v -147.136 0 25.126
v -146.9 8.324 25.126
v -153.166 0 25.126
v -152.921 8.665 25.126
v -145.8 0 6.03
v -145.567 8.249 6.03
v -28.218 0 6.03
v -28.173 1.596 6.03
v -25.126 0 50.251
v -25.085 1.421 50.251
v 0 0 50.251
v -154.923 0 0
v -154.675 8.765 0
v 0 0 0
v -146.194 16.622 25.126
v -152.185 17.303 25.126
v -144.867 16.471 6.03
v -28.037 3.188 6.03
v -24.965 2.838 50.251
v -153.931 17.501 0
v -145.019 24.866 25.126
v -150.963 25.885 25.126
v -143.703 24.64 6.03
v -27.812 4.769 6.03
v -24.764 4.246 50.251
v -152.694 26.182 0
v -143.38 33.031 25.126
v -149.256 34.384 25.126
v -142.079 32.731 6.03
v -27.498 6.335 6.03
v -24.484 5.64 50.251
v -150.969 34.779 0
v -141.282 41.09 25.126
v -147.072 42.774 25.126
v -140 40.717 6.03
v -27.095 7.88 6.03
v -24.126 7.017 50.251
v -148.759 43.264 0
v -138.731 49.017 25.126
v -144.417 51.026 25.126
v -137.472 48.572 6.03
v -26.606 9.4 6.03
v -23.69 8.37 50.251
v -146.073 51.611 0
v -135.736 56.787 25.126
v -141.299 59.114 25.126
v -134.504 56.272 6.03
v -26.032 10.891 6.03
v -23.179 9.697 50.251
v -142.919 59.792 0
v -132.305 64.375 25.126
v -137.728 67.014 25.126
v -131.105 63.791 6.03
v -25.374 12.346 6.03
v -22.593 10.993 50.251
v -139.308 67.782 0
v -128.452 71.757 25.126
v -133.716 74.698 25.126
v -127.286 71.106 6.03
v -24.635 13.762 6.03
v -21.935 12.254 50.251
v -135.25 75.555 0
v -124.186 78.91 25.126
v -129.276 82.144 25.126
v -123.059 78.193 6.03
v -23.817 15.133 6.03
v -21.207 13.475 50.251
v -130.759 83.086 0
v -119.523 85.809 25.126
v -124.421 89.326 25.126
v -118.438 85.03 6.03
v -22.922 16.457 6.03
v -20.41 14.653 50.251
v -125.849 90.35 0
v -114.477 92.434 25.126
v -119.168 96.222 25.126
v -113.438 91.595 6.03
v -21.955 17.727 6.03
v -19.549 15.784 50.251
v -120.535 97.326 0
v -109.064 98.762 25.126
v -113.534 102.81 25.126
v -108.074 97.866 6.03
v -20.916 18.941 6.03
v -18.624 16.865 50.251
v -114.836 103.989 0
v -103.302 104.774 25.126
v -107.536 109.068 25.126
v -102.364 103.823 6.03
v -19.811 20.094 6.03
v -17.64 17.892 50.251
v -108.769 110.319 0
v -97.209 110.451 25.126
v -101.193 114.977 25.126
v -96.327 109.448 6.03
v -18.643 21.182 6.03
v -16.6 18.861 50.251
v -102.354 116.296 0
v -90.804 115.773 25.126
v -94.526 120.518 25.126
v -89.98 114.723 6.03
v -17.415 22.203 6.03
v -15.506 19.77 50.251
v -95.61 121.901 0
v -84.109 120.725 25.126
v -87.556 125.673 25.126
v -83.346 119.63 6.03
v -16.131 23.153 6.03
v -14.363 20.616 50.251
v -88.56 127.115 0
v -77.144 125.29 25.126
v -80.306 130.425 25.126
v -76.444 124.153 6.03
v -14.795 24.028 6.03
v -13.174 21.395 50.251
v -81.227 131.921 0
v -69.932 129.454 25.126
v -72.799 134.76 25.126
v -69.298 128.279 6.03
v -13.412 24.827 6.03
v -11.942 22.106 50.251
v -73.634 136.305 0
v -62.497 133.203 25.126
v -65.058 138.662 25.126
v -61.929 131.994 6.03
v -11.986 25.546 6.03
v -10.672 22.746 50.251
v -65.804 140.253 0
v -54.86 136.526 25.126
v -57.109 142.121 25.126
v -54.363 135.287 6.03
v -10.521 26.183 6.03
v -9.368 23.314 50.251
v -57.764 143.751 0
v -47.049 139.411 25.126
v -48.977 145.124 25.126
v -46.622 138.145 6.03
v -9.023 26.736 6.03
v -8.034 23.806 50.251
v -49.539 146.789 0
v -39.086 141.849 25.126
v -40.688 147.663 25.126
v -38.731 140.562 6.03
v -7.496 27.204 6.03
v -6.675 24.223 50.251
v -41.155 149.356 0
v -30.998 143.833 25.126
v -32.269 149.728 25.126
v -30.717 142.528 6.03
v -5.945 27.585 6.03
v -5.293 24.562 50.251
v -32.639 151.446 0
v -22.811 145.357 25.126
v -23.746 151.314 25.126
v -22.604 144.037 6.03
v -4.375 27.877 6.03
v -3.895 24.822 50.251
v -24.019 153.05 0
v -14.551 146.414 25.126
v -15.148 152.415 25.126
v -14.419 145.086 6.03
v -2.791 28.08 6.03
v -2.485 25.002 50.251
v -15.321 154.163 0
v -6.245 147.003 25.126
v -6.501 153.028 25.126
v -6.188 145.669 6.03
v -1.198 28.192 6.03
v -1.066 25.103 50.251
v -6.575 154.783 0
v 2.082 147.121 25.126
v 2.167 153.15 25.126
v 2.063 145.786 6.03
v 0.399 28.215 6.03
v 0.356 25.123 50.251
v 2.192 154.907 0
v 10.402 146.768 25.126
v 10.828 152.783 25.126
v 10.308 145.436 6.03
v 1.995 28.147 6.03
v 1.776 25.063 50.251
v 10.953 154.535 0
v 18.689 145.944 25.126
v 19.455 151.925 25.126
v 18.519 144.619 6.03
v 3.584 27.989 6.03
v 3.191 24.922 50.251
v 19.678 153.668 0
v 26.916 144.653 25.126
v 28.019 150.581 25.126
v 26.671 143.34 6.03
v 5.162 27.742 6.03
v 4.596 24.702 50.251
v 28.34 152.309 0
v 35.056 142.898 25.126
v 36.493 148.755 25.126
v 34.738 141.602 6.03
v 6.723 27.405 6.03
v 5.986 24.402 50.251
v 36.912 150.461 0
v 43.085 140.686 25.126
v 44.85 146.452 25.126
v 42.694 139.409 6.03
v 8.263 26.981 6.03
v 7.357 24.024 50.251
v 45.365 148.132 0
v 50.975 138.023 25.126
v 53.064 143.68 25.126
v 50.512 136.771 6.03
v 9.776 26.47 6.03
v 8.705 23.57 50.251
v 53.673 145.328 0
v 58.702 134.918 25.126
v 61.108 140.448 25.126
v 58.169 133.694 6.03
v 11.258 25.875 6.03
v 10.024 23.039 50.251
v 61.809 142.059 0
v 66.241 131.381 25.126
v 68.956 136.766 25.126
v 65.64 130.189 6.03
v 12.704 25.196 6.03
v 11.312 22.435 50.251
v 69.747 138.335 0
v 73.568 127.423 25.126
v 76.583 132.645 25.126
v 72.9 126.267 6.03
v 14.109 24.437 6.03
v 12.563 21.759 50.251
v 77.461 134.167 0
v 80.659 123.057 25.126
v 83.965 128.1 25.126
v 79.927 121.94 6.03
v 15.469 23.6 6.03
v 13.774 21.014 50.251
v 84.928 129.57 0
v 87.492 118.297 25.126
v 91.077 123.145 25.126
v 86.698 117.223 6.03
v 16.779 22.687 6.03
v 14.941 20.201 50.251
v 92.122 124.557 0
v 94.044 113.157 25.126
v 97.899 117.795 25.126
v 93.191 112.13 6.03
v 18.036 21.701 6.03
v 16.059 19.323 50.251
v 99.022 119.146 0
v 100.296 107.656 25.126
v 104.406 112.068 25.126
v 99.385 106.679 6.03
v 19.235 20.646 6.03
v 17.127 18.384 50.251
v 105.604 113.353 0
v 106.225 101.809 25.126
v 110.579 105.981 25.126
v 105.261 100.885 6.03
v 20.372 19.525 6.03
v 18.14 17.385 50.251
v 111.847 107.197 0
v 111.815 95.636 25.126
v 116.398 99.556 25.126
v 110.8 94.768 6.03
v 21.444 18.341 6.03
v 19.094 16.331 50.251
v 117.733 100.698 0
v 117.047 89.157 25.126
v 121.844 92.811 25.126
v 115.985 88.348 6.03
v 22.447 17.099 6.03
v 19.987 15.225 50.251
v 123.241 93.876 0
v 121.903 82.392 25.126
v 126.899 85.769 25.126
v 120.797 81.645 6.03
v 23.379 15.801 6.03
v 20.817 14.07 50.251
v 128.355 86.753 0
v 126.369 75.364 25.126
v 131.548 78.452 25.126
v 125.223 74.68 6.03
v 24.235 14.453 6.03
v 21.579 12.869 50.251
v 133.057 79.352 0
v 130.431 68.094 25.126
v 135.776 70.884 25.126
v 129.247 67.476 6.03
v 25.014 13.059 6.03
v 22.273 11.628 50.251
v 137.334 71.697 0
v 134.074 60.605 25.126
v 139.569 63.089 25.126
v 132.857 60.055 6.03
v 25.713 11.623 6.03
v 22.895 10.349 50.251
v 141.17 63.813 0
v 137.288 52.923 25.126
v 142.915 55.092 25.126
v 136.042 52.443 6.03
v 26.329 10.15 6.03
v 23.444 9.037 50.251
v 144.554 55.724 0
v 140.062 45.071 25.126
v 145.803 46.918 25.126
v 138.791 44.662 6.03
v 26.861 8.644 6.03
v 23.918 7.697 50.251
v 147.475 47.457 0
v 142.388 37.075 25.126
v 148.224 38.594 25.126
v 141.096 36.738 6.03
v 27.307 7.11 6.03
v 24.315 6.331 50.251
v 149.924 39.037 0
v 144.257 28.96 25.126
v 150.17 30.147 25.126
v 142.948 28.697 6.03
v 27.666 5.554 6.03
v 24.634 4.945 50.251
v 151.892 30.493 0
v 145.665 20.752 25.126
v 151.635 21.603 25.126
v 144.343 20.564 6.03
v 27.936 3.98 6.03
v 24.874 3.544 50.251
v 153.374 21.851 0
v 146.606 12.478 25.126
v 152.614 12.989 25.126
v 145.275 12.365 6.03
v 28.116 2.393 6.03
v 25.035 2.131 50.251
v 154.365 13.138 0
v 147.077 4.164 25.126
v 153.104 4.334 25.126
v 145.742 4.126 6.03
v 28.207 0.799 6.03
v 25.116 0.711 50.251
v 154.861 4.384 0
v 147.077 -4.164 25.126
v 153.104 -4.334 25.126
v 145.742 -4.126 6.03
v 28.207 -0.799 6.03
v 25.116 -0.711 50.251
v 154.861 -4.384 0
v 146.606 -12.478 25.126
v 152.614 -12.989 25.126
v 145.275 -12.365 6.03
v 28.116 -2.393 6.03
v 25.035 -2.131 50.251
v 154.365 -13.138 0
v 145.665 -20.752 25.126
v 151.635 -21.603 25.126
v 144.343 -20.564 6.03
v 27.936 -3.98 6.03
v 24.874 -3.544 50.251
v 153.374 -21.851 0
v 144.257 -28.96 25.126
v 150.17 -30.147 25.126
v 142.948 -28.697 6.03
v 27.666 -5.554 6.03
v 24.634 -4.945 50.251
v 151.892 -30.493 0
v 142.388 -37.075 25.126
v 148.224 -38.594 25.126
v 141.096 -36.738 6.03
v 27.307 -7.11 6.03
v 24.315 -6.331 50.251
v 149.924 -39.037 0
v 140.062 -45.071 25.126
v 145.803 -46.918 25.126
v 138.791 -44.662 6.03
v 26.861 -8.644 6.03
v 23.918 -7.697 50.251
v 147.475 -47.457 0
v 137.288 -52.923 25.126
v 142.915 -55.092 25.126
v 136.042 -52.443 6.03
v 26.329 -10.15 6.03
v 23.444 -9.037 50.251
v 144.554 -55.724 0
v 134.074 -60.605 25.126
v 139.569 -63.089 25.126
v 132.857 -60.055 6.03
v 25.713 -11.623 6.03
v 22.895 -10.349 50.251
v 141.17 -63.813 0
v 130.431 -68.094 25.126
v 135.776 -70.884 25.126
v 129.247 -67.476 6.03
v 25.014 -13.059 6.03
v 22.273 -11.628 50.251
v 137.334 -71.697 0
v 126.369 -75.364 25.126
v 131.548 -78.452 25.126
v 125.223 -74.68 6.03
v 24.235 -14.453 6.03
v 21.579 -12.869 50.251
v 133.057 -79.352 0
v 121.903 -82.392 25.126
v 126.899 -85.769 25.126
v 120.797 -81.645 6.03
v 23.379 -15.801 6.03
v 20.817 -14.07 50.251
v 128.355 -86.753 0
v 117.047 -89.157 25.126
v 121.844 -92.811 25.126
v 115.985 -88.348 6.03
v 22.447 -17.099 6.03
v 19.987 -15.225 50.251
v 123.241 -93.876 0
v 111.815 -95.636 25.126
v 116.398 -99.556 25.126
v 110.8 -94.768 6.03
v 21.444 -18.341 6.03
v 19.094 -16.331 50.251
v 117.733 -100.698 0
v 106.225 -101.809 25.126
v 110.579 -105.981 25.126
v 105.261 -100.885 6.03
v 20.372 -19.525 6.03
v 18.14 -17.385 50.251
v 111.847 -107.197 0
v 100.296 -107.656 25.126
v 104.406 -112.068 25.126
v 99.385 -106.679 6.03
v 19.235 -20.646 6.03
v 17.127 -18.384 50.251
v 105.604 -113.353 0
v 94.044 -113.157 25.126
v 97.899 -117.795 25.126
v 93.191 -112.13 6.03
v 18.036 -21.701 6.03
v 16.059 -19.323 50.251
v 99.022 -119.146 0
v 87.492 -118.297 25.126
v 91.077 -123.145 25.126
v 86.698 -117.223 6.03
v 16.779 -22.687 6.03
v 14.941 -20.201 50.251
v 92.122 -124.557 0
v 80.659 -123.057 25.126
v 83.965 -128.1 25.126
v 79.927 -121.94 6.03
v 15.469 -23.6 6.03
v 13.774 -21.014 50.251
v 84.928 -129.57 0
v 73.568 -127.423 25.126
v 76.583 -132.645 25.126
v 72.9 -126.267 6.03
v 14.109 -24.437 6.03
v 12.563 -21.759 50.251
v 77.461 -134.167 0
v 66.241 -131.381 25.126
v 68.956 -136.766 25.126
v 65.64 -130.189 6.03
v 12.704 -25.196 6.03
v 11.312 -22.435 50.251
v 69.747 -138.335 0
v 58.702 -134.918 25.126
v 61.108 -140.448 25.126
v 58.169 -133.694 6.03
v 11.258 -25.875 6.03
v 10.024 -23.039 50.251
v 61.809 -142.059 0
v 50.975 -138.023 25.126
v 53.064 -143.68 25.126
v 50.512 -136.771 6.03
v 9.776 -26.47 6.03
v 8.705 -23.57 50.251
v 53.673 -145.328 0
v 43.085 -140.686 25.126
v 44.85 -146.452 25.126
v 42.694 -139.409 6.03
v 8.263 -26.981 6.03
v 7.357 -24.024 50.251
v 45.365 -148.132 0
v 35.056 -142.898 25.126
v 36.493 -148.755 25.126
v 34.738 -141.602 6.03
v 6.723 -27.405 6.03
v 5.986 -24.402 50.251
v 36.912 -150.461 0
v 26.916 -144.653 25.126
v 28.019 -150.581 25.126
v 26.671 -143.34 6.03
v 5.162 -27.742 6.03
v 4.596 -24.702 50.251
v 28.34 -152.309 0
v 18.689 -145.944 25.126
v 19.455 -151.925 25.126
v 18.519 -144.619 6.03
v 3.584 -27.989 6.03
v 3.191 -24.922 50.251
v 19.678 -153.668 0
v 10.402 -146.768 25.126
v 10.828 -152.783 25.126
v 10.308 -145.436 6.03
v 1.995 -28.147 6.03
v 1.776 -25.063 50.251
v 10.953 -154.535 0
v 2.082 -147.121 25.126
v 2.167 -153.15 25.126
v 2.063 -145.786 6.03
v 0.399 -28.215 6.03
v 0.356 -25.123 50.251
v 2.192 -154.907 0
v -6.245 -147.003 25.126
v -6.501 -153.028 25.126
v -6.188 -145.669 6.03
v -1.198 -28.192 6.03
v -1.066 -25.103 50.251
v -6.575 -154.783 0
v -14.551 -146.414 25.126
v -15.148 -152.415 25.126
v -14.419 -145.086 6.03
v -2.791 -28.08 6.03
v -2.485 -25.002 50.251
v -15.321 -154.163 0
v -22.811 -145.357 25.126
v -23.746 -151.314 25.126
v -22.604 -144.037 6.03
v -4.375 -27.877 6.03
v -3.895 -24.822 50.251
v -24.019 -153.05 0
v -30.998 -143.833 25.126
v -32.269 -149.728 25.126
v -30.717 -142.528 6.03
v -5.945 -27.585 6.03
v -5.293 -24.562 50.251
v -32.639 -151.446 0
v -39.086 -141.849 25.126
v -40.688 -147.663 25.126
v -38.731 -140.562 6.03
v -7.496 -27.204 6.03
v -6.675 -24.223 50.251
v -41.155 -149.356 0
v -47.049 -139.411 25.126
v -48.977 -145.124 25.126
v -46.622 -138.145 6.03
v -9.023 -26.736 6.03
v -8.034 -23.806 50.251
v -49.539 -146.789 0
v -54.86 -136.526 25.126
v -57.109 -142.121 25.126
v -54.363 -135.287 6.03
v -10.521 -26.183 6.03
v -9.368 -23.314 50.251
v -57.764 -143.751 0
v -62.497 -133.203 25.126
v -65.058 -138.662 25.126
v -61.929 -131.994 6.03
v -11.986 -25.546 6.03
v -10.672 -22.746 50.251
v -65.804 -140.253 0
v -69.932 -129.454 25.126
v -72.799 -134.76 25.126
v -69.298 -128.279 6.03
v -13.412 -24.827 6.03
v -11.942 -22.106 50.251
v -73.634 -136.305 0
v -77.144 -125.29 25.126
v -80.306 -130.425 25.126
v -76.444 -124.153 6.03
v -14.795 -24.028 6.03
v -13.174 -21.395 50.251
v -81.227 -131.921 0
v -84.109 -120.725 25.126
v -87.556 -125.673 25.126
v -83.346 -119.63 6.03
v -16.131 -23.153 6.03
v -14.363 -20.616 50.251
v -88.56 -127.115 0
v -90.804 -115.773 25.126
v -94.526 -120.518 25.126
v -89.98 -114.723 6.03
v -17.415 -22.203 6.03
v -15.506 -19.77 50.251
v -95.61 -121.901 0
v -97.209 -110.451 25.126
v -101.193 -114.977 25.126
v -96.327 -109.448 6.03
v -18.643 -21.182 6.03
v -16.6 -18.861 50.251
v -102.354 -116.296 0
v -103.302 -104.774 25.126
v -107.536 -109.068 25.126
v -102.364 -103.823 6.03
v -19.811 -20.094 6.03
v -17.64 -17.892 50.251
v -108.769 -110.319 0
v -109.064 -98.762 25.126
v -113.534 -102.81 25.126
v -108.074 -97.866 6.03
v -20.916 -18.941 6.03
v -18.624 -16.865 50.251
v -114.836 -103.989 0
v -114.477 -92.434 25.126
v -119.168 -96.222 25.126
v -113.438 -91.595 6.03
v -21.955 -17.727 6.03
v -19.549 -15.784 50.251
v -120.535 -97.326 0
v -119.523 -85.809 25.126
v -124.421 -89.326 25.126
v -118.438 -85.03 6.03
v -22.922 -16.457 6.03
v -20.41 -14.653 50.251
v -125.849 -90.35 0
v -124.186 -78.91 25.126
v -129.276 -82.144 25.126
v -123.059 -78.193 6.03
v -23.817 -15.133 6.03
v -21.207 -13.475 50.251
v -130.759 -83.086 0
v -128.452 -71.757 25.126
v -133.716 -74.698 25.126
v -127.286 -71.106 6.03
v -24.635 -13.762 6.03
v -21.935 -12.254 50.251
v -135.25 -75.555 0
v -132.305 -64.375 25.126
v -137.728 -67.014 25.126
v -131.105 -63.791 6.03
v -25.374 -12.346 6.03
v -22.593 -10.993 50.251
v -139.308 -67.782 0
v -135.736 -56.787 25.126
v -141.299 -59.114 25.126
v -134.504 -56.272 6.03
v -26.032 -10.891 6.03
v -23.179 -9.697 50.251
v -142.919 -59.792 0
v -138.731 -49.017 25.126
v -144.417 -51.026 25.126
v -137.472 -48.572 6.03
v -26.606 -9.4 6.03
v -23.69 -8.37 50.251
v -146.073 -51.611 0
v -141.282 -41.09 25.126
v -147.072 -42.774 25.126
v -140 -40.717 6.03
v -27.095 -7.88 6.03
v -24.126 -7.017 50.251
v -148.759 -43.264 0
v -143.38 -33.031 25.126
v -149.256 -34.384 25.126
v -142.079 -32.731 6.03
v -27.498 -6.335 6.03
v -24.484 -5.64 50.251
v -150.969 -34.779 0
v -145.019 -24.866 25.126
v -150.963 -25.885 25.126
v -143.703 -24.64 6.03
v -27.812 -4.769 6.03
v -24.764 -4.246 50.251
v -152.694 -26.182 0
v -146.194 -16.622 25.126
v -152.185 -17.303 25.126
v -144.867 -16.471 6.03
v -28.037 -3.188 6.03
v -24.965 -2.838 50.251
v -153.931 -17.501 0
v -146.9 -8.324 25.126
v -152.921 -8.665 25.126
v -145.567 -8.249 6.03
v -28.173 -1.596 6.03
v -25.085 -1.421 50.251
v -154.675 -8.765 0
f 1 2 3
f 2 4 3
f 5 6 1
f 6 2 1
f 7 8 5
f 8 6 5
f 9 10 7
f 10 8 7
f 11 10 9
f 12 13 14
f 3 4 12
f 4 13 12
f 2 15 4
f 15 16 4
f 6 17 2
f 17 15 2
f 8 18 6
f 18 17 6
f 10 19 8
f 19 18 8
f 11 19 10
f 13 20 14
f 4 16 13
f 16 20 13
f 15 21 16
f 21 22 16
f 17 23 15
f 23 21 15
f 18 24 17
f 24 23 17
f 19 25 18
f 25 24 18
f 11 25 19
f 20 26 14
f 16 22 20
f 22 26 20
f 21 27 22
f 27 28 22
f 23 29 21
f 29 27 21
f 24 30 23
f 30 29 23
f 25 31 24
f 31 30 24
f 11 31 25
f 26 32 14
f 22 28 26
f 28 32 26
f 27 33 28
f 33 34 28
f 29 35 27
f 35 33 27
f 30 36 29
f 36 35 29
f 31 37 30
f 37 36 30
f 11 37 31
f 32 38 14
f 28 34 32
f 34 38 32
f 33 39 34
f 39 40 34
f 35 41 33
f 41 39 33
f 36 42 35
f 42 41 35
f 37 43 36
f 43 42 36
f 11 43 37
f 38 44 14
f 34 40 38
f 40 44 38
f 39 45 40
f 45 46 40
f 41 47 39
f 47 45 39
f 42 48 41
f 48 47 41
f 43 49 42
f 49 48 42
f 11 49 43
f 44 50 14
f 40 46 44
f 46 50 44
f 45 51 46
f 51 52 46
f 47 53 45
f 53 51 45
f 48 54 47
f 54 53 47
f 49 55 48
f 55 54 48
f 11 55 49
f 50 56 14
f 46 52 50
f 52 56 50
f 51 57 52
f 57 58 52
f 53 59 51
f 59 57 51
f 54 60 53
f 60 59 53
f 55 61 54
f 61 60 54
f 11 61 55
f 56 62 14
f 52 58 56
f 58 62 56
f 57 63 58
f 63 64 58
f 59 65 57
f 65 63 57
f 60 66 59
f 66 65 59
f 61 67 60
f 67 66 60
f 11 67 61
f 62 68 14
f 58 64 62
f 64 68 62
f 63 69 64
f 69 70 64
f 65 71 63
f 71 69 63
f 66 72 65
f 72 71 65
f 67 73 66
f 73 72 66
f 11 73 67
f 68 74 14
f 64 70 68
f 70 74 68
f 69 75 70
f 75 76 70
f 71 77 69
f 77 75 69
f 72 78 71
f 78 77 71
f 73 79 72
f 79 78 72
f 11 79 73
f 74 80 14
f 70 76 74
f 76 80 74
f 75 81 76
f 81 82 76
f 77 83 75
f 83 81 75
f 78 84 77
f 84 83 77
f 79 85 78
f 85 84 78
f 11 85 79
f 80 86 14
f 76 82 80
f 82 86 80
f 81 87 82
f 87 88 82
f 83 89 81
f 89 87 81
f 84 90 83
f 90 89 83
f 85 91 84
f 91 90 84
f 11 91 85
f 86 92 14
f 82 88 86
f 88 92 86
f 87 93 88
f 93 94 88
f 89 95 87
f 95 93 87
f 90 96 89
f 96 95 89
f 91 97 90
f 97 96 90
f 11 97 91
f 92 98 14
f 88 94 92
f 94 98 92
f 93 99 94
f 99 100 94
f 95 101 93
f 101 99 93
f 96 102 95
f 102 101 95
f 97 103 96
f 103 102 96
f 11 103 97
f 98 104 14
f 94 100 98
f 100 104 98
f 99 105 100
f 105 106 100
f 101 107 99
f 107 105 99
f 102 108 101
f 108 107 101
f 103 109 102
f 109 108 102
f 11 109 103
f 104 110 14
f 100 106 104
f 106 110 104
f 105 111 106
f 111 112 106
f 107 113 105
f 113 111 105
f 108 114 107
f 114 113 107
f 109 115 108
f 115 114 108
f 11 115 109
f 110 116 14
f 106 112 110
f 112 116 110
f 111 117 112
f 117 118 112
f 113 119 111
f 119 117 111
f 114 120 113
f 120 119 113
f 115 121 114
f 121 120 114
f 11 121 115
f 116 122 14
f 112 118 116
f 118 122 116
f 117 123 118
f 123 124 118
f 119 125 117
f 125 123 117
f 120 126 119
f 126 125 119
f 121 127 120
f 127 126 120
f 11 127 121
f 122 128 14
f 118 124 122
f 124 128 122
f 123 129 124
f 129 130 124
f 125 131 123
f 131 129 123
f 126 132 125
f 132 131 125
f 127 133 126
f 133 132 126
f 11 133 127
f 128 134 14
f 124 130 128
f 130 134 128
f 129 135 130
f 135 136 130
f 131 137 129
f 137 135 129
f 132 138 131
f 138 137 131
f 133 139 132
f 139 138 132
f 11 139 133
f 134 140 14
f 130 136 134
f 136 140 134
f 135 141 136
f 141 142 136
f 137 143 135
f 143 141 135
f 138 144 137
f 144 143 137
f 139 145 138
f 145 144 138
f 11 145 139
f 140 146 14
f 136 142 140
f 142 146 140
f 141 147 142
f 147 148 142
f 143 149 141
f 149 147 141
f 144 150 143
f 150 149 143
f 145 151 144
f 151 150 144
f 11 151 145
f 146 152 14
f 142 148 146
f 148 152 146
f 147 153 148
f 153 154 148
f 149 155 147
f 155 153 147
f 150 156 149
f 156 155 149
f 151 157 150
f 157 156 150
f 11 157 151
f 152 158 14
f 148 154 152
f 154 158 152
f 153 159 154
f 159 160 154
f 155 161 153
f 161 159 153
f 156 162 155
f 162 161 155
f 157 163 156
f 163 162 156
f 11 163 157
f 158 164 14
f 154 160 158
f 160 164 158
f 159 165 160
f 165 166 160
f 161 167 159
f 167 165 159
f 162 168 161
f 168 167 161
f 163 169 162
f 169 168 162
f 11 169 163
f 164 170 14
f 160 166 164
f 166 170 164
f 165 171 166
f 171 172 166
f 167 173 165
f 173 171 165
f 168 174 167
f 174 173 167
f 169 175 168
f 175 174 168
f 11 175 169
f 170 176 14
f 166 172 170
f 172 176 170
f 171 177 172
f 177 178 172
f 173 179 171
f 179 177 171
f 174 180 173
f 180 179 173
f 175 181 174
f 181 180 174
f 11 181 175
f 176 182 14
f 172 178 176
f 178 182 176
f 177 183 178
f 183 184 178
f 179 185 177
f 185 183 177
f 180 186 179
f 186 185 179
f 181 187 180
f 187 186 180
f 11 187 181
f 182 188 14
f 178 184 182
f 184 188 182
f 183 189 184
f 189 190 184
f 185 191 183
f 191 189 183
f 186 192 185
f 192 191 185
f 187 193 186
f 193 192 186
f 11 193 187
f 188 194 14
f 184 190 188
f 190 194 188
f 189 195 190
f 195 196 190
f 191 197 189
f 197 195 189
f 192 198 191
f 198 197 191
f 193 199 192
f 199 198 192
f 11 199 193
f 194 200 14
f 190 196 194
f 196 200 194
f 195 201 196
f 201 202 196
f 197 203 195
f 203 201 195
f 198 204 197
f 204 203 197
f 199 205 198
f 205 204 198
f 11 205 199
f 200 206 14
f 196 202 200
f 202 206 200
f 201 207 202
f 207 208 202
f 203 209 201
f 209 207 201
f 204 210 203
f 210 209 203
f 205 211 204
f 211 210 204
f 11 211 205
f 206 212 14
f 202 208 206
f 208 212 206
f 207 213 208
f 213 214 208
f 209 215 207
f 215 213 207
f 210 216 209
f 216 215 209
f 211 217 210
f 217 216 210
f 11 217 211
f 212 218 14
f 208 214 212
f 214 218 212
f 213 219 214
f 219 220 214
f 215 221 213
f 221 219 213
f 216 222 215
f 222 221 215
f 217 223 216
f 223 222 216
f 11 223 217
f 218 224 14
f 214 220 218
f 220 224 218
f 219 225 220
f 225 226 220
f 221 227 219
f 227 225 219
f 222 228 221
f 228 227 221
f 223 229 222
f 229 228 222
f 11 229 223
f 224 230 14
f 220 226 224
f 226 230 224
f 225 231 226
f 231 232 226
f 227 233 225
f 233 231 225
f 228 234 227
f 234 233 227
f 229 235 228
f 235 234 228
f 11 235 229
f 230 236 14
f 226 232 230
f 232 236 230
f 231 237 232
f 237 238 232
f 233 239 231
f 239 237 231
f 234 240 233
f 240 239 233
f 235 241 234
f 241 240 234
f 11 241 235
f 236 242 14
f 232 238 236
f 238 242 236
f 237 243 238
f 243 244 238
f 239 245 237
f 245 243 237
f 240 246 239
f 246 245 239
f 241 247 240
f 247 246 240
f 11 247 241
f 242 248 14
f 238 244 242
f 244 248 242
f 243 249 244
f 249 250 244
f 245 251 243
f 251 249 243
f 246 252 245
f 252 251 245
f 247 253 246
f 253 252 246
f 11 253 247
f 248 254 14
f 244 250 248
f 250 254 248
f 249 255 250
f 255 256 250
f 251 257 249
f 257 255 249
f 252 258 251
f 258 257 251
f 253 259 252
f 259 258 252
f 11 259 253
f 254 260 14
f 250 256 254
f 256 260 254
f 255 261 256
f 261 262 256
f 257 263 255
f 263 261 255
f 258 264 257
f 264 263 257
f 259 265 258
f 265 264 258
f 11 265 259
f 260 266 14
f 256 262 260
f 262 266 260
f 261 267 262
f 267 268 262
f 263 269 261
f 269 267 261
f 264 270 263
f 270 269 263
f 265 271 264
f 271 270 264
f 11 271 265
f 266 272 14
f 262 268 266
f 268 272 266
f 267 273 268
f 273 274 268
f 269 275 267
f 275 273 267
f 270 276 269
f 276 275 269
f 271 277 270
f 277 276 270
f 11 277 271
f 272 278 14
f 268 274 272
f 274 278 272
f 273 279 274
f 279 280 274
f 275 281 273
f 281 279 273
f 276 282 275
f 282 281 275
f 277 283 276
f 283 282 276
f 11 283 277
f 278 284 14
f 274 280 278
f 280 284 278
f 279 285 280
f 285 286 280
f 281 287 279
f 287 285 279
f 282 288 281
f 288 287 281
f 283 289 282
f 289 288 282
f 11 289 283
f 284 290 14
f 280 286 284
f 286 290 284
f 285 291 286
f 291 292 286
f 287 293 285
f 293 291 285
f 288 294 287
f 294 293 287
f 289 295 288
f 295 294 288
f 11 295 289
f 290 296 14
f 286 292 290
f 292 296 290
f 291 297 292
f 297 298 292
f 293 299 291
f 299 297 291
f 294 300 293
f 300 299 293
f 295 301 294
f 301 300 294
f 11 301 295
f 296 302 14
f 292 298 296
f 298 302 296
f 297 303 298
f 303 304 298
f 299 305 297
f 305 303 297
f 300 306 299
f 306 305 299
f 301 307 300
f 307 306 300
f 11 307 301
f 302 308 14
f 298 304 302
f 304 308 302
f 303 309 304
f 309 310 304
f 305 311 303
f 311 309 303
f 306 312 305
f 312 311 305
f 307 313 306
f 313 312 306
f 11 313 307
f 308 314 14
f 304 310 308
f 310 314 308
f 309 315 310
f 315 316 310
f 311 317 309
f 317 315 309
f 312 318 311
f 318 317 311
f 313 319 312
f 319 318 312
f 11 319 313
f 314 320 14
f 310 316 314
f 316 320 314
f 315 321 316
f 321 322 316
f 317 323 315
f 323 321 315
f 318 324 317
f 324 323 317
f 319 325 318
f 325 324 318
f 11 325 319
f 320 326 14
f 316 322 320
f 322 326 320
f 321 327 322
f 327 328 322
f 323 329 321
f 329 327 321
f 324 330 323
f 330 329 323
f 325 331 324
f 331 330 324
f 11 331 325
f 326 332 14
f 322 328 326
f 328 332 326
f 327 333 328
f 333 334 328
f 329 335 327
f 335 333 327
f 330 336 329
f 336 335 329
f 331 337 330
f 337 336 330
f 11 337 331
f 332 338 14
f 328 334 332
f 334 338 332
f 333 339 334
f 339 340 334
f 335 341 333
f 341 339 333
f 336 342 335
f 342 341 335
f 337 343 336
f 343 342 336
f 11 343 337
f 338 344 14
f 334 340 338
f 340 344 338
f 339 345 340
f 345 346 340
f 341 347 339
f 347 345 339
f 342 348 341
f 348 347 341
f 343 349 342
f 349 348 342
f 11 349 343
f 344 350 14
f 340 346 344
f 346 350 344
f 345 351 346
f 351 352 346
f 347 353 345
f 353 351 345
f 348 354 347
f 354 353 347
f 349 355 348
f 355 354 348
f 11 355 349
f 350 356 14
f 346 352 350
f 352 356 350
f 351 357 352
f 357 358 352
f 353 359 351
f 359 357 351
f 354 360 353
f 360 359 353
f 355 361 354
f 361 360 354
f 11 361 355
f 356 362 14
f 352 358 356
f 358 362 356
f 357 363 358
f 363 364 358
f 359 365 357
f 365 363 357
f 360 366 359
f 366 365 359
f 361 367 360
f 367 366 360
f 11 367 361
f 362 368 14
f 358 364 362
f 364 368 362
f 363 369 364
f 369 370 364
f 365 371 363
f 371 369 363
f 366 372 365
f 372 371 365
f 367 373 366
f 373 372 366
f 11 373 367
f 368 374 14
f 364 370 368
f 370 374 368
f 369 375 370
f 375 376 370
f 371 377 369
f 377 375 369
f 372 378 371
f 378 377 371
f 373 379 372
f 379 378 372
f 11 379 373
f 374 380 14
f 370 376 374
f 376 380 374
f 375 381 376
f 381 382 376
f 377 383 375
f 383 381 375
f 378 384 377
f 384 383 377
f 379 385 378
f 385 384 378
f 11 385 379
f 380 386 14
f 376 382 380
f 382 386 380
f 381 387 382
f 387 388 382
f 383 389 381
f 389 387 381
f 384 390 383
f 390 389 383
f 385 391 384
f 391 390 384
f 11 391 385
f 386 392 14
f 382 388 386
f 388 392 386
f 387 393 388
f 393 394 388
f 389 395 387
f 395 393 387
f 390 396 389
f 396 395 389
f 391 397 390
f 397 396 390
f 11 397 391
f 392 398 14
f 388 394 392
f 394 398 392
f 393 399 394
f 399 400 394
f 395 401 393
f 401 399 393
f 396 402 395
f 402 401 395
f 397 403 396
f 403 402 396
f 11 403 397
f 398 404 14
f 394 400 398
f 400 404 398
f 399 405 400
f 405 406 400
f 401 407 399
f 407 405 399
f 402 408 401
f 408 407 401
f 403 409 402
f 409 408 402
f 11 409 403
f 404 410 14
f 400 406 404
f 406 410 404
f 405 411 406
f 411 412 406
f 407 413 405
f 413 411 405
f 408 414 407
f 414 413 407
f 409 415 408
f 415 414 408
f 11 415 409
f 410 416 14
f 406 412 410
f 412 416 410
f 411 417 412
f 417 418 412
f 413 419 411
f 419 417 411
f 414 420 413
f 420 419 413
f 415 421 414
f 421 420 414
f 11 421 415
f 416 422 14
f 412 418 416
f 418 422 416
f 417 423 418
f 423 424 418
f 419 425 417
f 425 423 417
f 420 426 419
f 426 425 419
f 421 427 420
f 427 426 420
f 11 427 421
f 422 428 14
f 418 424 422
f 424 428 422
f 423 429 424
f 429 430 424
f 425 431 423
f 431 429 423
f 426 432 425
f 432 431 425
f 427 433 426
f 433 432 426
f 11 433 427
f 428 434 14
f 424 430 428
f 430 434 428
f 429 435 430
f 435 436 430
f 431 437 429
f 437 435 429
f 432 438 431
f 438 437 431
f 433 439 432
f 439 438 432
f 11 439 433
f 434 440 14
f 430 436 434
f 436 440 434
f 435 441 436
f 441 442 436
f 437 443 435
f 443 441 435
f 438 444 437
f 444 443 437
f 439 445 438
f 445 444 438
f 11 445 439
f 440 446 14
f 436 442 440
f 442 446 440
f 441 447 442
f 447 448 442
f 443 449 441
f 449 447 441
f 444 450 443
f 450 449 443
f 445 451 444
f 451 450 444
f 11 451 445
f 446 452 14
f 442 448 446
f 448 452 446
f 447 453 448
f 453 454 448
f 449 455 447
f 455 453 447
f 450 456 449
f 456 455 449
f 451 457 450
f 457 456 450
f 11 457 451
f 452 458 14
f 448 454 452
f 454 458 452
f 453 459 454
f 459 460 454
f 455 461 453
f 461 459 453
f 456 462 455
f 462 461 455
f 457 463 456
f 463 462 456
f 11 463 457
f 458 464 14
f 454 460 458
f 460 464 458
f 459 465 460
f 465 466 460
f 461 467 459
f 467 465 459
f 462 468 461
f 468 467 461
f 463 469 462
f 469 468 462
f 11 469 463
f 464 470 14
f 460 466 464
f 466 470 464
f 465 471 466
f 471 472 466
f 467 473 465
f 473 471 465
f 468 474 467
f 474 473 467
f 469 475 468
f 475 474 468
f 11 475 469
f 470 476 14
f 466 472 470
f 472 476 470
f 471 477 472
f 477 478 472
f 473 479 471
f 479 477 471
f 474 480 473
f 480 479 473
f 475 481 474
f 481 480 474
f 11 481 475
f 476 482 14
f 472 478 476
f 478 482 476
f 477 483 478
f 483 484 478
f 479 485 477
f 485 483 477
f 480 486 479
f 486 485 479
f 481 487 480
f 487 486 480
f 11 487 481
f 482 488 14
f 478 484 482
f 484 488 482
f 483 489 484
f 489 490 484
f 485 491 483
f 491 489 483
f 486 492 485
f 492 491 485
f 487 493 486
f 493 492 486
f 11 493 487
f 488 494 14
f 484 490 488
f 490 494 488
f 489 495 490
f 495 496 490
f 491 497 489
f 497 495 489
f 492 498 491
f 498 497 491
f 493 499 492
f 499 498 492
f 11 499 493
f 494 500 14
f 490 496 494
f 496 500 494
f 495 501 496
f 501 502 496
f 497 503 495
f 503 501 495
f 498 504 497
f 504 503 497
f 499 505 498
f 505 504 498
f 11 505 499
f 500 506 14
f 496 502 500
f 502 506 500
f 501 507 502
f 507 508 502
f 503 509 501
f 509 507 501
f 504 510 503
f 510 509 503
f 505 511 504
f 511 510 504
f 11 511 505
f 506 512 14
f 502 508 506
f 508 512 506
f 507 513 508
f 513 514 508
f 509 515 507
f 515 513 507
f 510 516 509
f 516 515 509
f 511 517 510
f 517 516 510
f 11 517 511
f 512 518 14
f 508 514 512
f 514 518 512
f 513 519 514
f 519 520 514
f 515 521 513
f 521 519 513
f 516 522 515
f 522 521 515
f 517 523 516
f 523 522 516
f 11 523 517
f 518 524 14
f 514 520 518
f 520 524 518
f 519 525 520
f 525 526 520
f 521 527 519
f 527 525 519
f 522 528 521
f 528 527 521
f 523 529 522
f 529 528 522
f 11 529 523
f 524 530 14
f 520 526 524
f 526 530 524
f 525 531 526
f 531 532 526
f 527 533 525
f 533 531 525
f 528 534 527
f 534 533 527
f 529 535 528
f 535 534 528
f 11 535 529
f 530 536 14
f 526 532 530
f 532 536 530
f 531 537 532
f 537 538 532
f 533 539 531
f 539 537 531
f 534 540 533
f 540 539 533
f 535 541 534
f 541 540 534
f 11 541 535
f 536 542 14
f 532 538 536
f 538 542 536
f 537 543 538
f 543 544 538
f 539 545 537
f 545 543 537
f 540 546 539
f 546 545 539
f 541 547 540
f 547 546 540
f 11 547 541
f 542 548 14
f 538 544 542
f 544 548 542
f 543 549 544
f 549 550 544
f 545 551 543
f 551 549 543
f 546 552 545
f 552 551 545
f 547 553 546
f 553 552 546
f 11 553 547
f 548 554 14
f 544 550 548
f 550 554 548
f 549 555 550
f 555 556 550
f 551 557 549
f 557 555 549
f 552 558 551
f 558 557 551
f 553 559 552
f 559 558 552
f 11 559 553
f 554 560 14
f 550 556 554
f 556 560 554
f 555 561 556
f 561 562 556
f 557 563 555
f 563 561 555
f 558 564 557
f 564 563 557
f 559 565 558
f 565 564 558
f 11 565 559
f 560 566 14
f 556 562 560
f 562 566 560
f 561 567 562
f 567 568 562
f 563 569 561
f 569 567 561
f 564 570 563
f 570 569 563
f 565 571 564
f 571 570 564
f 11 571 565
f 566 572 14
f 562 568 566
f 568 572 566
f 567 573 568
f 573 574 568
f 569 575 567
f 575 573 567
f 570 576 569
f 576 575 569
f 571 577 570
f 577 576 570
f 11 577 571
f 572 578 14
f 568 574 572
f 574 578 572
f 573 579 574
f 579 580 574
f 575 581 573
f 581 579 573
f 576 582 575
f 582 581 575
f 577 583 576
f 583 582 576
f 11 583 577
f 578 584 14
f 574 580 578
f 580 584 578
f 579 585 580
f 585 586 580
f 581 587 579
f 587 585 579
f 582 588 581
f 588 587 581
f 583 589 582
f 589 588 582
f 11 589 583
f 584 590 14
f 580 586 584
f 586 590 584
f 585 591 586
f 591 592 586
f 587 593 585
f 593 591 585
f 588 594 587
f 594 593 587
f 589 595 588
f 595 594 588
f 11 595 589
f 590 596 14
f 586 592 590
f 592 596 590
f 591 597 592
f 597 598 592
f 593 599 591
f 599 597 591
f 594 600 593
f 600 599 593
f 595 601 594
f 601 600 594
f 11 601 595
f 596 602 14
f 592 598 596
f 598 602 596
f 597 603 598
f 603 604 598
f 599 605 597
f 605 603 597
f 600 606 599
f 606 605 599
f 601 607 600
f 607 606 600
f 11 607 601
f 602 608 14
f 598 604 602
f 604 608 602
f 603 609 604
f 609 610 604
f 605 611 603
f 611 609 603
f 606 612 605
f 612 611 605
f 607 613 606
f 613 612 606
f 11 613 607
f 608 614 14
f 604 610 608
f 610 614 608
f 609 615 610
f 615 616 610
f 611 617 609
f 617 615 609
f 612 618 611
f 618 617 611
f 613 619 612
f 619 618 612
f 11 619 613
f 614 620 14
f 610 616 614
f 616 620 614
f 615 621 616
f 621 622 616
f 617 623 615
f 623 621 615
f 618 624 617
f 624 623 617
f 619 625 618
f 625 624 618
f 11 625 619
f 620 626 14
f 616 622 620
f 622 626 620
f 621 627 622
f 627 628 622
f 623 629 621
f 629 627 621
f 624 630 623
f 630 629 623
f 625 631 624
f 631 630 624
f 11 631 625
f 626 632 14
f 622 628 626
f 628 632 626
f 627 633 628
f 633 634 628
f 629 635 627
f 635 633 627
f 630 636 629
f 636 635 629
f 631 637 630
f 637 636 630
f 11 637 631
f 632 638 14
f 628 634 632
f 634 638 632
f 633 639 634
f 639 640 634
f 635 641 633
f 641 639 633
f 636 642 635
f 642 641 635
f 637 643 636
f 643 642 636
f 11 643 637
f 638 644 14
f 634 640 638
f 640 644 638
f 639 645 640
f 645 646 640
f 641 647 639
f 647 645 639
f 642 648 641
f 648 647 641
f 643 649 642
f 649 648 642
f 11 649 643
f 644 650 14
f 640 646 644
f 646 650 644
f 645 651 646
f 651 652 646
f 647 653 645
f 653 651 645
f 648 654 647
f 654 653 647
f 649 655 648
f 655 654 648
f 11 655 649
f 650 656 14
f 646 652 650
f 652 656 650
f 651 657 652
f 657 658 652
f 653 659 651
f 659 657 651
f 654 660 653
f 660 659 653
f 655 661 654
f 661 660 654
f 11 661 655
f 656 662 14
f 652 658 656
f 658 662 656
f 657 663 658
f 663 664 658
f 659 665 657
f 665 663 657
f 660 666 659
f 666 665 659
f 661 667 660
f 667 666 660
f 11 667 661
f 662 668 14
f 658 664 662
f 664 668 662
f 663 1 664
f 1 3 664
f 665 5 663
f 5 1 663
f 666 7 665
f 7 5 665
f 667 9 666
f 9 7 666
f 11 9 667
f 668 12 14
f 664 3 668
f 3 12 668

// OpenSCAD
//------------------------------------------------------------------
/*

Pottery Wheel

A wheel with a flat surface on one side and a hub on the other.

*/
//------------------------------------------------------------------
/* [Global] */

/*[General]*/
wheel_diameter = 25.4 * 12;
hub_diameter = 50;
hub_height = 50;
shaft_diameter = 25.4;
shaft_length = 40;
wall_height = 25;
wall_thickness = 6;
plate_thickness = 6;

/*[Webs]*/
number_of_webs = 6;
web_size_at_hub = 0.8; // [0:0.05:1]
web_height_at_wall = 0.8; // [0:0.05:1]

/*[Casting]*/
draft_angle = 4;

/*[Fillets]*/
fillet_factor = 2.0;
rounding_factor = 0.2; // [0:0.05:1]

/* [Hidden] */
//------------------------------------------------------------------
// Set the scaling value to compensate for print shrinkage

scale = 1/0.995; // ABS ~0.5% shrinkage
//scale = 1/0.998; // PLA ~0.2% shrinkage

function dim(x) = scale * x;

//------------------------------------------------------------------
// derived values

wheel_r = dim(wheel_diameter/2);
hub_r = dim(hub_diameter/2);
hub_h = dim(hub_height);
shaft_r = dim(shaft_diameter/2);
shaft_l = dim(shaft_length);
wall_h = dim(wall_height);
wall_t = dim(wall_thickness);
plate_t = dim(plate_thickness);

//------------------------------------------------------------------
// control the number of facets on cylinders

facet_epsilon = 0.01;
function facets(r) = 180 / acos(1 - (facet_epsilon / r));

// small tweak to avoid differencing artifacts
epsilon = 0.05;

//------------------------------------------------------------------
// rounded/filleted edges

module outset(d=1) {
  minkowski() {
    circle(r=d, $fn=facets(d));
    children(0);
  }
}

module inset(d=1) {
  render() inverse() outset(d=d) inverse() children(0);
}

module inverse() {
  difference() {
    square(1e5, center=true);
    children(0);
  }
}

module rounded(r=1) {
  outset(d=r) inset(d=r) children(0);
}

module filleted(r=1) {
  inset(d=r) render() outset(d=r) children(0);
}

//------------------------------------------------------------------
// generate a 2D polygon for the wheel profile

module wheel_profile() {

  draft0 = (hub_h - plate_t) * tan(draft_angle);
  draft1 = (wall_h - plate_t) * tan(draft_angle);
  draft2 = wall_h * tan(draft_angle);

  points = [
    [0, 0],
    [0, hub_h],
    [hub_r, hub_h],
    [hub_r + draft0, plate_t],
    [wheel_r - wall_t - draft1, plate_t],
    [wheel_r - wall_t, wall_h],
    [wheel_r, wall_h],
    [wheel_r + draft2, 0],
  ];

  polygon(points=points, convexity = 2);
}

//------------------------------------------------------------------

module wheel() {
  rotate_extrude(angle = 360, $fn = facets(hub_r)) {
    wheel_profile();
  }
}

wheel();

//------------------------------------------------------------------
